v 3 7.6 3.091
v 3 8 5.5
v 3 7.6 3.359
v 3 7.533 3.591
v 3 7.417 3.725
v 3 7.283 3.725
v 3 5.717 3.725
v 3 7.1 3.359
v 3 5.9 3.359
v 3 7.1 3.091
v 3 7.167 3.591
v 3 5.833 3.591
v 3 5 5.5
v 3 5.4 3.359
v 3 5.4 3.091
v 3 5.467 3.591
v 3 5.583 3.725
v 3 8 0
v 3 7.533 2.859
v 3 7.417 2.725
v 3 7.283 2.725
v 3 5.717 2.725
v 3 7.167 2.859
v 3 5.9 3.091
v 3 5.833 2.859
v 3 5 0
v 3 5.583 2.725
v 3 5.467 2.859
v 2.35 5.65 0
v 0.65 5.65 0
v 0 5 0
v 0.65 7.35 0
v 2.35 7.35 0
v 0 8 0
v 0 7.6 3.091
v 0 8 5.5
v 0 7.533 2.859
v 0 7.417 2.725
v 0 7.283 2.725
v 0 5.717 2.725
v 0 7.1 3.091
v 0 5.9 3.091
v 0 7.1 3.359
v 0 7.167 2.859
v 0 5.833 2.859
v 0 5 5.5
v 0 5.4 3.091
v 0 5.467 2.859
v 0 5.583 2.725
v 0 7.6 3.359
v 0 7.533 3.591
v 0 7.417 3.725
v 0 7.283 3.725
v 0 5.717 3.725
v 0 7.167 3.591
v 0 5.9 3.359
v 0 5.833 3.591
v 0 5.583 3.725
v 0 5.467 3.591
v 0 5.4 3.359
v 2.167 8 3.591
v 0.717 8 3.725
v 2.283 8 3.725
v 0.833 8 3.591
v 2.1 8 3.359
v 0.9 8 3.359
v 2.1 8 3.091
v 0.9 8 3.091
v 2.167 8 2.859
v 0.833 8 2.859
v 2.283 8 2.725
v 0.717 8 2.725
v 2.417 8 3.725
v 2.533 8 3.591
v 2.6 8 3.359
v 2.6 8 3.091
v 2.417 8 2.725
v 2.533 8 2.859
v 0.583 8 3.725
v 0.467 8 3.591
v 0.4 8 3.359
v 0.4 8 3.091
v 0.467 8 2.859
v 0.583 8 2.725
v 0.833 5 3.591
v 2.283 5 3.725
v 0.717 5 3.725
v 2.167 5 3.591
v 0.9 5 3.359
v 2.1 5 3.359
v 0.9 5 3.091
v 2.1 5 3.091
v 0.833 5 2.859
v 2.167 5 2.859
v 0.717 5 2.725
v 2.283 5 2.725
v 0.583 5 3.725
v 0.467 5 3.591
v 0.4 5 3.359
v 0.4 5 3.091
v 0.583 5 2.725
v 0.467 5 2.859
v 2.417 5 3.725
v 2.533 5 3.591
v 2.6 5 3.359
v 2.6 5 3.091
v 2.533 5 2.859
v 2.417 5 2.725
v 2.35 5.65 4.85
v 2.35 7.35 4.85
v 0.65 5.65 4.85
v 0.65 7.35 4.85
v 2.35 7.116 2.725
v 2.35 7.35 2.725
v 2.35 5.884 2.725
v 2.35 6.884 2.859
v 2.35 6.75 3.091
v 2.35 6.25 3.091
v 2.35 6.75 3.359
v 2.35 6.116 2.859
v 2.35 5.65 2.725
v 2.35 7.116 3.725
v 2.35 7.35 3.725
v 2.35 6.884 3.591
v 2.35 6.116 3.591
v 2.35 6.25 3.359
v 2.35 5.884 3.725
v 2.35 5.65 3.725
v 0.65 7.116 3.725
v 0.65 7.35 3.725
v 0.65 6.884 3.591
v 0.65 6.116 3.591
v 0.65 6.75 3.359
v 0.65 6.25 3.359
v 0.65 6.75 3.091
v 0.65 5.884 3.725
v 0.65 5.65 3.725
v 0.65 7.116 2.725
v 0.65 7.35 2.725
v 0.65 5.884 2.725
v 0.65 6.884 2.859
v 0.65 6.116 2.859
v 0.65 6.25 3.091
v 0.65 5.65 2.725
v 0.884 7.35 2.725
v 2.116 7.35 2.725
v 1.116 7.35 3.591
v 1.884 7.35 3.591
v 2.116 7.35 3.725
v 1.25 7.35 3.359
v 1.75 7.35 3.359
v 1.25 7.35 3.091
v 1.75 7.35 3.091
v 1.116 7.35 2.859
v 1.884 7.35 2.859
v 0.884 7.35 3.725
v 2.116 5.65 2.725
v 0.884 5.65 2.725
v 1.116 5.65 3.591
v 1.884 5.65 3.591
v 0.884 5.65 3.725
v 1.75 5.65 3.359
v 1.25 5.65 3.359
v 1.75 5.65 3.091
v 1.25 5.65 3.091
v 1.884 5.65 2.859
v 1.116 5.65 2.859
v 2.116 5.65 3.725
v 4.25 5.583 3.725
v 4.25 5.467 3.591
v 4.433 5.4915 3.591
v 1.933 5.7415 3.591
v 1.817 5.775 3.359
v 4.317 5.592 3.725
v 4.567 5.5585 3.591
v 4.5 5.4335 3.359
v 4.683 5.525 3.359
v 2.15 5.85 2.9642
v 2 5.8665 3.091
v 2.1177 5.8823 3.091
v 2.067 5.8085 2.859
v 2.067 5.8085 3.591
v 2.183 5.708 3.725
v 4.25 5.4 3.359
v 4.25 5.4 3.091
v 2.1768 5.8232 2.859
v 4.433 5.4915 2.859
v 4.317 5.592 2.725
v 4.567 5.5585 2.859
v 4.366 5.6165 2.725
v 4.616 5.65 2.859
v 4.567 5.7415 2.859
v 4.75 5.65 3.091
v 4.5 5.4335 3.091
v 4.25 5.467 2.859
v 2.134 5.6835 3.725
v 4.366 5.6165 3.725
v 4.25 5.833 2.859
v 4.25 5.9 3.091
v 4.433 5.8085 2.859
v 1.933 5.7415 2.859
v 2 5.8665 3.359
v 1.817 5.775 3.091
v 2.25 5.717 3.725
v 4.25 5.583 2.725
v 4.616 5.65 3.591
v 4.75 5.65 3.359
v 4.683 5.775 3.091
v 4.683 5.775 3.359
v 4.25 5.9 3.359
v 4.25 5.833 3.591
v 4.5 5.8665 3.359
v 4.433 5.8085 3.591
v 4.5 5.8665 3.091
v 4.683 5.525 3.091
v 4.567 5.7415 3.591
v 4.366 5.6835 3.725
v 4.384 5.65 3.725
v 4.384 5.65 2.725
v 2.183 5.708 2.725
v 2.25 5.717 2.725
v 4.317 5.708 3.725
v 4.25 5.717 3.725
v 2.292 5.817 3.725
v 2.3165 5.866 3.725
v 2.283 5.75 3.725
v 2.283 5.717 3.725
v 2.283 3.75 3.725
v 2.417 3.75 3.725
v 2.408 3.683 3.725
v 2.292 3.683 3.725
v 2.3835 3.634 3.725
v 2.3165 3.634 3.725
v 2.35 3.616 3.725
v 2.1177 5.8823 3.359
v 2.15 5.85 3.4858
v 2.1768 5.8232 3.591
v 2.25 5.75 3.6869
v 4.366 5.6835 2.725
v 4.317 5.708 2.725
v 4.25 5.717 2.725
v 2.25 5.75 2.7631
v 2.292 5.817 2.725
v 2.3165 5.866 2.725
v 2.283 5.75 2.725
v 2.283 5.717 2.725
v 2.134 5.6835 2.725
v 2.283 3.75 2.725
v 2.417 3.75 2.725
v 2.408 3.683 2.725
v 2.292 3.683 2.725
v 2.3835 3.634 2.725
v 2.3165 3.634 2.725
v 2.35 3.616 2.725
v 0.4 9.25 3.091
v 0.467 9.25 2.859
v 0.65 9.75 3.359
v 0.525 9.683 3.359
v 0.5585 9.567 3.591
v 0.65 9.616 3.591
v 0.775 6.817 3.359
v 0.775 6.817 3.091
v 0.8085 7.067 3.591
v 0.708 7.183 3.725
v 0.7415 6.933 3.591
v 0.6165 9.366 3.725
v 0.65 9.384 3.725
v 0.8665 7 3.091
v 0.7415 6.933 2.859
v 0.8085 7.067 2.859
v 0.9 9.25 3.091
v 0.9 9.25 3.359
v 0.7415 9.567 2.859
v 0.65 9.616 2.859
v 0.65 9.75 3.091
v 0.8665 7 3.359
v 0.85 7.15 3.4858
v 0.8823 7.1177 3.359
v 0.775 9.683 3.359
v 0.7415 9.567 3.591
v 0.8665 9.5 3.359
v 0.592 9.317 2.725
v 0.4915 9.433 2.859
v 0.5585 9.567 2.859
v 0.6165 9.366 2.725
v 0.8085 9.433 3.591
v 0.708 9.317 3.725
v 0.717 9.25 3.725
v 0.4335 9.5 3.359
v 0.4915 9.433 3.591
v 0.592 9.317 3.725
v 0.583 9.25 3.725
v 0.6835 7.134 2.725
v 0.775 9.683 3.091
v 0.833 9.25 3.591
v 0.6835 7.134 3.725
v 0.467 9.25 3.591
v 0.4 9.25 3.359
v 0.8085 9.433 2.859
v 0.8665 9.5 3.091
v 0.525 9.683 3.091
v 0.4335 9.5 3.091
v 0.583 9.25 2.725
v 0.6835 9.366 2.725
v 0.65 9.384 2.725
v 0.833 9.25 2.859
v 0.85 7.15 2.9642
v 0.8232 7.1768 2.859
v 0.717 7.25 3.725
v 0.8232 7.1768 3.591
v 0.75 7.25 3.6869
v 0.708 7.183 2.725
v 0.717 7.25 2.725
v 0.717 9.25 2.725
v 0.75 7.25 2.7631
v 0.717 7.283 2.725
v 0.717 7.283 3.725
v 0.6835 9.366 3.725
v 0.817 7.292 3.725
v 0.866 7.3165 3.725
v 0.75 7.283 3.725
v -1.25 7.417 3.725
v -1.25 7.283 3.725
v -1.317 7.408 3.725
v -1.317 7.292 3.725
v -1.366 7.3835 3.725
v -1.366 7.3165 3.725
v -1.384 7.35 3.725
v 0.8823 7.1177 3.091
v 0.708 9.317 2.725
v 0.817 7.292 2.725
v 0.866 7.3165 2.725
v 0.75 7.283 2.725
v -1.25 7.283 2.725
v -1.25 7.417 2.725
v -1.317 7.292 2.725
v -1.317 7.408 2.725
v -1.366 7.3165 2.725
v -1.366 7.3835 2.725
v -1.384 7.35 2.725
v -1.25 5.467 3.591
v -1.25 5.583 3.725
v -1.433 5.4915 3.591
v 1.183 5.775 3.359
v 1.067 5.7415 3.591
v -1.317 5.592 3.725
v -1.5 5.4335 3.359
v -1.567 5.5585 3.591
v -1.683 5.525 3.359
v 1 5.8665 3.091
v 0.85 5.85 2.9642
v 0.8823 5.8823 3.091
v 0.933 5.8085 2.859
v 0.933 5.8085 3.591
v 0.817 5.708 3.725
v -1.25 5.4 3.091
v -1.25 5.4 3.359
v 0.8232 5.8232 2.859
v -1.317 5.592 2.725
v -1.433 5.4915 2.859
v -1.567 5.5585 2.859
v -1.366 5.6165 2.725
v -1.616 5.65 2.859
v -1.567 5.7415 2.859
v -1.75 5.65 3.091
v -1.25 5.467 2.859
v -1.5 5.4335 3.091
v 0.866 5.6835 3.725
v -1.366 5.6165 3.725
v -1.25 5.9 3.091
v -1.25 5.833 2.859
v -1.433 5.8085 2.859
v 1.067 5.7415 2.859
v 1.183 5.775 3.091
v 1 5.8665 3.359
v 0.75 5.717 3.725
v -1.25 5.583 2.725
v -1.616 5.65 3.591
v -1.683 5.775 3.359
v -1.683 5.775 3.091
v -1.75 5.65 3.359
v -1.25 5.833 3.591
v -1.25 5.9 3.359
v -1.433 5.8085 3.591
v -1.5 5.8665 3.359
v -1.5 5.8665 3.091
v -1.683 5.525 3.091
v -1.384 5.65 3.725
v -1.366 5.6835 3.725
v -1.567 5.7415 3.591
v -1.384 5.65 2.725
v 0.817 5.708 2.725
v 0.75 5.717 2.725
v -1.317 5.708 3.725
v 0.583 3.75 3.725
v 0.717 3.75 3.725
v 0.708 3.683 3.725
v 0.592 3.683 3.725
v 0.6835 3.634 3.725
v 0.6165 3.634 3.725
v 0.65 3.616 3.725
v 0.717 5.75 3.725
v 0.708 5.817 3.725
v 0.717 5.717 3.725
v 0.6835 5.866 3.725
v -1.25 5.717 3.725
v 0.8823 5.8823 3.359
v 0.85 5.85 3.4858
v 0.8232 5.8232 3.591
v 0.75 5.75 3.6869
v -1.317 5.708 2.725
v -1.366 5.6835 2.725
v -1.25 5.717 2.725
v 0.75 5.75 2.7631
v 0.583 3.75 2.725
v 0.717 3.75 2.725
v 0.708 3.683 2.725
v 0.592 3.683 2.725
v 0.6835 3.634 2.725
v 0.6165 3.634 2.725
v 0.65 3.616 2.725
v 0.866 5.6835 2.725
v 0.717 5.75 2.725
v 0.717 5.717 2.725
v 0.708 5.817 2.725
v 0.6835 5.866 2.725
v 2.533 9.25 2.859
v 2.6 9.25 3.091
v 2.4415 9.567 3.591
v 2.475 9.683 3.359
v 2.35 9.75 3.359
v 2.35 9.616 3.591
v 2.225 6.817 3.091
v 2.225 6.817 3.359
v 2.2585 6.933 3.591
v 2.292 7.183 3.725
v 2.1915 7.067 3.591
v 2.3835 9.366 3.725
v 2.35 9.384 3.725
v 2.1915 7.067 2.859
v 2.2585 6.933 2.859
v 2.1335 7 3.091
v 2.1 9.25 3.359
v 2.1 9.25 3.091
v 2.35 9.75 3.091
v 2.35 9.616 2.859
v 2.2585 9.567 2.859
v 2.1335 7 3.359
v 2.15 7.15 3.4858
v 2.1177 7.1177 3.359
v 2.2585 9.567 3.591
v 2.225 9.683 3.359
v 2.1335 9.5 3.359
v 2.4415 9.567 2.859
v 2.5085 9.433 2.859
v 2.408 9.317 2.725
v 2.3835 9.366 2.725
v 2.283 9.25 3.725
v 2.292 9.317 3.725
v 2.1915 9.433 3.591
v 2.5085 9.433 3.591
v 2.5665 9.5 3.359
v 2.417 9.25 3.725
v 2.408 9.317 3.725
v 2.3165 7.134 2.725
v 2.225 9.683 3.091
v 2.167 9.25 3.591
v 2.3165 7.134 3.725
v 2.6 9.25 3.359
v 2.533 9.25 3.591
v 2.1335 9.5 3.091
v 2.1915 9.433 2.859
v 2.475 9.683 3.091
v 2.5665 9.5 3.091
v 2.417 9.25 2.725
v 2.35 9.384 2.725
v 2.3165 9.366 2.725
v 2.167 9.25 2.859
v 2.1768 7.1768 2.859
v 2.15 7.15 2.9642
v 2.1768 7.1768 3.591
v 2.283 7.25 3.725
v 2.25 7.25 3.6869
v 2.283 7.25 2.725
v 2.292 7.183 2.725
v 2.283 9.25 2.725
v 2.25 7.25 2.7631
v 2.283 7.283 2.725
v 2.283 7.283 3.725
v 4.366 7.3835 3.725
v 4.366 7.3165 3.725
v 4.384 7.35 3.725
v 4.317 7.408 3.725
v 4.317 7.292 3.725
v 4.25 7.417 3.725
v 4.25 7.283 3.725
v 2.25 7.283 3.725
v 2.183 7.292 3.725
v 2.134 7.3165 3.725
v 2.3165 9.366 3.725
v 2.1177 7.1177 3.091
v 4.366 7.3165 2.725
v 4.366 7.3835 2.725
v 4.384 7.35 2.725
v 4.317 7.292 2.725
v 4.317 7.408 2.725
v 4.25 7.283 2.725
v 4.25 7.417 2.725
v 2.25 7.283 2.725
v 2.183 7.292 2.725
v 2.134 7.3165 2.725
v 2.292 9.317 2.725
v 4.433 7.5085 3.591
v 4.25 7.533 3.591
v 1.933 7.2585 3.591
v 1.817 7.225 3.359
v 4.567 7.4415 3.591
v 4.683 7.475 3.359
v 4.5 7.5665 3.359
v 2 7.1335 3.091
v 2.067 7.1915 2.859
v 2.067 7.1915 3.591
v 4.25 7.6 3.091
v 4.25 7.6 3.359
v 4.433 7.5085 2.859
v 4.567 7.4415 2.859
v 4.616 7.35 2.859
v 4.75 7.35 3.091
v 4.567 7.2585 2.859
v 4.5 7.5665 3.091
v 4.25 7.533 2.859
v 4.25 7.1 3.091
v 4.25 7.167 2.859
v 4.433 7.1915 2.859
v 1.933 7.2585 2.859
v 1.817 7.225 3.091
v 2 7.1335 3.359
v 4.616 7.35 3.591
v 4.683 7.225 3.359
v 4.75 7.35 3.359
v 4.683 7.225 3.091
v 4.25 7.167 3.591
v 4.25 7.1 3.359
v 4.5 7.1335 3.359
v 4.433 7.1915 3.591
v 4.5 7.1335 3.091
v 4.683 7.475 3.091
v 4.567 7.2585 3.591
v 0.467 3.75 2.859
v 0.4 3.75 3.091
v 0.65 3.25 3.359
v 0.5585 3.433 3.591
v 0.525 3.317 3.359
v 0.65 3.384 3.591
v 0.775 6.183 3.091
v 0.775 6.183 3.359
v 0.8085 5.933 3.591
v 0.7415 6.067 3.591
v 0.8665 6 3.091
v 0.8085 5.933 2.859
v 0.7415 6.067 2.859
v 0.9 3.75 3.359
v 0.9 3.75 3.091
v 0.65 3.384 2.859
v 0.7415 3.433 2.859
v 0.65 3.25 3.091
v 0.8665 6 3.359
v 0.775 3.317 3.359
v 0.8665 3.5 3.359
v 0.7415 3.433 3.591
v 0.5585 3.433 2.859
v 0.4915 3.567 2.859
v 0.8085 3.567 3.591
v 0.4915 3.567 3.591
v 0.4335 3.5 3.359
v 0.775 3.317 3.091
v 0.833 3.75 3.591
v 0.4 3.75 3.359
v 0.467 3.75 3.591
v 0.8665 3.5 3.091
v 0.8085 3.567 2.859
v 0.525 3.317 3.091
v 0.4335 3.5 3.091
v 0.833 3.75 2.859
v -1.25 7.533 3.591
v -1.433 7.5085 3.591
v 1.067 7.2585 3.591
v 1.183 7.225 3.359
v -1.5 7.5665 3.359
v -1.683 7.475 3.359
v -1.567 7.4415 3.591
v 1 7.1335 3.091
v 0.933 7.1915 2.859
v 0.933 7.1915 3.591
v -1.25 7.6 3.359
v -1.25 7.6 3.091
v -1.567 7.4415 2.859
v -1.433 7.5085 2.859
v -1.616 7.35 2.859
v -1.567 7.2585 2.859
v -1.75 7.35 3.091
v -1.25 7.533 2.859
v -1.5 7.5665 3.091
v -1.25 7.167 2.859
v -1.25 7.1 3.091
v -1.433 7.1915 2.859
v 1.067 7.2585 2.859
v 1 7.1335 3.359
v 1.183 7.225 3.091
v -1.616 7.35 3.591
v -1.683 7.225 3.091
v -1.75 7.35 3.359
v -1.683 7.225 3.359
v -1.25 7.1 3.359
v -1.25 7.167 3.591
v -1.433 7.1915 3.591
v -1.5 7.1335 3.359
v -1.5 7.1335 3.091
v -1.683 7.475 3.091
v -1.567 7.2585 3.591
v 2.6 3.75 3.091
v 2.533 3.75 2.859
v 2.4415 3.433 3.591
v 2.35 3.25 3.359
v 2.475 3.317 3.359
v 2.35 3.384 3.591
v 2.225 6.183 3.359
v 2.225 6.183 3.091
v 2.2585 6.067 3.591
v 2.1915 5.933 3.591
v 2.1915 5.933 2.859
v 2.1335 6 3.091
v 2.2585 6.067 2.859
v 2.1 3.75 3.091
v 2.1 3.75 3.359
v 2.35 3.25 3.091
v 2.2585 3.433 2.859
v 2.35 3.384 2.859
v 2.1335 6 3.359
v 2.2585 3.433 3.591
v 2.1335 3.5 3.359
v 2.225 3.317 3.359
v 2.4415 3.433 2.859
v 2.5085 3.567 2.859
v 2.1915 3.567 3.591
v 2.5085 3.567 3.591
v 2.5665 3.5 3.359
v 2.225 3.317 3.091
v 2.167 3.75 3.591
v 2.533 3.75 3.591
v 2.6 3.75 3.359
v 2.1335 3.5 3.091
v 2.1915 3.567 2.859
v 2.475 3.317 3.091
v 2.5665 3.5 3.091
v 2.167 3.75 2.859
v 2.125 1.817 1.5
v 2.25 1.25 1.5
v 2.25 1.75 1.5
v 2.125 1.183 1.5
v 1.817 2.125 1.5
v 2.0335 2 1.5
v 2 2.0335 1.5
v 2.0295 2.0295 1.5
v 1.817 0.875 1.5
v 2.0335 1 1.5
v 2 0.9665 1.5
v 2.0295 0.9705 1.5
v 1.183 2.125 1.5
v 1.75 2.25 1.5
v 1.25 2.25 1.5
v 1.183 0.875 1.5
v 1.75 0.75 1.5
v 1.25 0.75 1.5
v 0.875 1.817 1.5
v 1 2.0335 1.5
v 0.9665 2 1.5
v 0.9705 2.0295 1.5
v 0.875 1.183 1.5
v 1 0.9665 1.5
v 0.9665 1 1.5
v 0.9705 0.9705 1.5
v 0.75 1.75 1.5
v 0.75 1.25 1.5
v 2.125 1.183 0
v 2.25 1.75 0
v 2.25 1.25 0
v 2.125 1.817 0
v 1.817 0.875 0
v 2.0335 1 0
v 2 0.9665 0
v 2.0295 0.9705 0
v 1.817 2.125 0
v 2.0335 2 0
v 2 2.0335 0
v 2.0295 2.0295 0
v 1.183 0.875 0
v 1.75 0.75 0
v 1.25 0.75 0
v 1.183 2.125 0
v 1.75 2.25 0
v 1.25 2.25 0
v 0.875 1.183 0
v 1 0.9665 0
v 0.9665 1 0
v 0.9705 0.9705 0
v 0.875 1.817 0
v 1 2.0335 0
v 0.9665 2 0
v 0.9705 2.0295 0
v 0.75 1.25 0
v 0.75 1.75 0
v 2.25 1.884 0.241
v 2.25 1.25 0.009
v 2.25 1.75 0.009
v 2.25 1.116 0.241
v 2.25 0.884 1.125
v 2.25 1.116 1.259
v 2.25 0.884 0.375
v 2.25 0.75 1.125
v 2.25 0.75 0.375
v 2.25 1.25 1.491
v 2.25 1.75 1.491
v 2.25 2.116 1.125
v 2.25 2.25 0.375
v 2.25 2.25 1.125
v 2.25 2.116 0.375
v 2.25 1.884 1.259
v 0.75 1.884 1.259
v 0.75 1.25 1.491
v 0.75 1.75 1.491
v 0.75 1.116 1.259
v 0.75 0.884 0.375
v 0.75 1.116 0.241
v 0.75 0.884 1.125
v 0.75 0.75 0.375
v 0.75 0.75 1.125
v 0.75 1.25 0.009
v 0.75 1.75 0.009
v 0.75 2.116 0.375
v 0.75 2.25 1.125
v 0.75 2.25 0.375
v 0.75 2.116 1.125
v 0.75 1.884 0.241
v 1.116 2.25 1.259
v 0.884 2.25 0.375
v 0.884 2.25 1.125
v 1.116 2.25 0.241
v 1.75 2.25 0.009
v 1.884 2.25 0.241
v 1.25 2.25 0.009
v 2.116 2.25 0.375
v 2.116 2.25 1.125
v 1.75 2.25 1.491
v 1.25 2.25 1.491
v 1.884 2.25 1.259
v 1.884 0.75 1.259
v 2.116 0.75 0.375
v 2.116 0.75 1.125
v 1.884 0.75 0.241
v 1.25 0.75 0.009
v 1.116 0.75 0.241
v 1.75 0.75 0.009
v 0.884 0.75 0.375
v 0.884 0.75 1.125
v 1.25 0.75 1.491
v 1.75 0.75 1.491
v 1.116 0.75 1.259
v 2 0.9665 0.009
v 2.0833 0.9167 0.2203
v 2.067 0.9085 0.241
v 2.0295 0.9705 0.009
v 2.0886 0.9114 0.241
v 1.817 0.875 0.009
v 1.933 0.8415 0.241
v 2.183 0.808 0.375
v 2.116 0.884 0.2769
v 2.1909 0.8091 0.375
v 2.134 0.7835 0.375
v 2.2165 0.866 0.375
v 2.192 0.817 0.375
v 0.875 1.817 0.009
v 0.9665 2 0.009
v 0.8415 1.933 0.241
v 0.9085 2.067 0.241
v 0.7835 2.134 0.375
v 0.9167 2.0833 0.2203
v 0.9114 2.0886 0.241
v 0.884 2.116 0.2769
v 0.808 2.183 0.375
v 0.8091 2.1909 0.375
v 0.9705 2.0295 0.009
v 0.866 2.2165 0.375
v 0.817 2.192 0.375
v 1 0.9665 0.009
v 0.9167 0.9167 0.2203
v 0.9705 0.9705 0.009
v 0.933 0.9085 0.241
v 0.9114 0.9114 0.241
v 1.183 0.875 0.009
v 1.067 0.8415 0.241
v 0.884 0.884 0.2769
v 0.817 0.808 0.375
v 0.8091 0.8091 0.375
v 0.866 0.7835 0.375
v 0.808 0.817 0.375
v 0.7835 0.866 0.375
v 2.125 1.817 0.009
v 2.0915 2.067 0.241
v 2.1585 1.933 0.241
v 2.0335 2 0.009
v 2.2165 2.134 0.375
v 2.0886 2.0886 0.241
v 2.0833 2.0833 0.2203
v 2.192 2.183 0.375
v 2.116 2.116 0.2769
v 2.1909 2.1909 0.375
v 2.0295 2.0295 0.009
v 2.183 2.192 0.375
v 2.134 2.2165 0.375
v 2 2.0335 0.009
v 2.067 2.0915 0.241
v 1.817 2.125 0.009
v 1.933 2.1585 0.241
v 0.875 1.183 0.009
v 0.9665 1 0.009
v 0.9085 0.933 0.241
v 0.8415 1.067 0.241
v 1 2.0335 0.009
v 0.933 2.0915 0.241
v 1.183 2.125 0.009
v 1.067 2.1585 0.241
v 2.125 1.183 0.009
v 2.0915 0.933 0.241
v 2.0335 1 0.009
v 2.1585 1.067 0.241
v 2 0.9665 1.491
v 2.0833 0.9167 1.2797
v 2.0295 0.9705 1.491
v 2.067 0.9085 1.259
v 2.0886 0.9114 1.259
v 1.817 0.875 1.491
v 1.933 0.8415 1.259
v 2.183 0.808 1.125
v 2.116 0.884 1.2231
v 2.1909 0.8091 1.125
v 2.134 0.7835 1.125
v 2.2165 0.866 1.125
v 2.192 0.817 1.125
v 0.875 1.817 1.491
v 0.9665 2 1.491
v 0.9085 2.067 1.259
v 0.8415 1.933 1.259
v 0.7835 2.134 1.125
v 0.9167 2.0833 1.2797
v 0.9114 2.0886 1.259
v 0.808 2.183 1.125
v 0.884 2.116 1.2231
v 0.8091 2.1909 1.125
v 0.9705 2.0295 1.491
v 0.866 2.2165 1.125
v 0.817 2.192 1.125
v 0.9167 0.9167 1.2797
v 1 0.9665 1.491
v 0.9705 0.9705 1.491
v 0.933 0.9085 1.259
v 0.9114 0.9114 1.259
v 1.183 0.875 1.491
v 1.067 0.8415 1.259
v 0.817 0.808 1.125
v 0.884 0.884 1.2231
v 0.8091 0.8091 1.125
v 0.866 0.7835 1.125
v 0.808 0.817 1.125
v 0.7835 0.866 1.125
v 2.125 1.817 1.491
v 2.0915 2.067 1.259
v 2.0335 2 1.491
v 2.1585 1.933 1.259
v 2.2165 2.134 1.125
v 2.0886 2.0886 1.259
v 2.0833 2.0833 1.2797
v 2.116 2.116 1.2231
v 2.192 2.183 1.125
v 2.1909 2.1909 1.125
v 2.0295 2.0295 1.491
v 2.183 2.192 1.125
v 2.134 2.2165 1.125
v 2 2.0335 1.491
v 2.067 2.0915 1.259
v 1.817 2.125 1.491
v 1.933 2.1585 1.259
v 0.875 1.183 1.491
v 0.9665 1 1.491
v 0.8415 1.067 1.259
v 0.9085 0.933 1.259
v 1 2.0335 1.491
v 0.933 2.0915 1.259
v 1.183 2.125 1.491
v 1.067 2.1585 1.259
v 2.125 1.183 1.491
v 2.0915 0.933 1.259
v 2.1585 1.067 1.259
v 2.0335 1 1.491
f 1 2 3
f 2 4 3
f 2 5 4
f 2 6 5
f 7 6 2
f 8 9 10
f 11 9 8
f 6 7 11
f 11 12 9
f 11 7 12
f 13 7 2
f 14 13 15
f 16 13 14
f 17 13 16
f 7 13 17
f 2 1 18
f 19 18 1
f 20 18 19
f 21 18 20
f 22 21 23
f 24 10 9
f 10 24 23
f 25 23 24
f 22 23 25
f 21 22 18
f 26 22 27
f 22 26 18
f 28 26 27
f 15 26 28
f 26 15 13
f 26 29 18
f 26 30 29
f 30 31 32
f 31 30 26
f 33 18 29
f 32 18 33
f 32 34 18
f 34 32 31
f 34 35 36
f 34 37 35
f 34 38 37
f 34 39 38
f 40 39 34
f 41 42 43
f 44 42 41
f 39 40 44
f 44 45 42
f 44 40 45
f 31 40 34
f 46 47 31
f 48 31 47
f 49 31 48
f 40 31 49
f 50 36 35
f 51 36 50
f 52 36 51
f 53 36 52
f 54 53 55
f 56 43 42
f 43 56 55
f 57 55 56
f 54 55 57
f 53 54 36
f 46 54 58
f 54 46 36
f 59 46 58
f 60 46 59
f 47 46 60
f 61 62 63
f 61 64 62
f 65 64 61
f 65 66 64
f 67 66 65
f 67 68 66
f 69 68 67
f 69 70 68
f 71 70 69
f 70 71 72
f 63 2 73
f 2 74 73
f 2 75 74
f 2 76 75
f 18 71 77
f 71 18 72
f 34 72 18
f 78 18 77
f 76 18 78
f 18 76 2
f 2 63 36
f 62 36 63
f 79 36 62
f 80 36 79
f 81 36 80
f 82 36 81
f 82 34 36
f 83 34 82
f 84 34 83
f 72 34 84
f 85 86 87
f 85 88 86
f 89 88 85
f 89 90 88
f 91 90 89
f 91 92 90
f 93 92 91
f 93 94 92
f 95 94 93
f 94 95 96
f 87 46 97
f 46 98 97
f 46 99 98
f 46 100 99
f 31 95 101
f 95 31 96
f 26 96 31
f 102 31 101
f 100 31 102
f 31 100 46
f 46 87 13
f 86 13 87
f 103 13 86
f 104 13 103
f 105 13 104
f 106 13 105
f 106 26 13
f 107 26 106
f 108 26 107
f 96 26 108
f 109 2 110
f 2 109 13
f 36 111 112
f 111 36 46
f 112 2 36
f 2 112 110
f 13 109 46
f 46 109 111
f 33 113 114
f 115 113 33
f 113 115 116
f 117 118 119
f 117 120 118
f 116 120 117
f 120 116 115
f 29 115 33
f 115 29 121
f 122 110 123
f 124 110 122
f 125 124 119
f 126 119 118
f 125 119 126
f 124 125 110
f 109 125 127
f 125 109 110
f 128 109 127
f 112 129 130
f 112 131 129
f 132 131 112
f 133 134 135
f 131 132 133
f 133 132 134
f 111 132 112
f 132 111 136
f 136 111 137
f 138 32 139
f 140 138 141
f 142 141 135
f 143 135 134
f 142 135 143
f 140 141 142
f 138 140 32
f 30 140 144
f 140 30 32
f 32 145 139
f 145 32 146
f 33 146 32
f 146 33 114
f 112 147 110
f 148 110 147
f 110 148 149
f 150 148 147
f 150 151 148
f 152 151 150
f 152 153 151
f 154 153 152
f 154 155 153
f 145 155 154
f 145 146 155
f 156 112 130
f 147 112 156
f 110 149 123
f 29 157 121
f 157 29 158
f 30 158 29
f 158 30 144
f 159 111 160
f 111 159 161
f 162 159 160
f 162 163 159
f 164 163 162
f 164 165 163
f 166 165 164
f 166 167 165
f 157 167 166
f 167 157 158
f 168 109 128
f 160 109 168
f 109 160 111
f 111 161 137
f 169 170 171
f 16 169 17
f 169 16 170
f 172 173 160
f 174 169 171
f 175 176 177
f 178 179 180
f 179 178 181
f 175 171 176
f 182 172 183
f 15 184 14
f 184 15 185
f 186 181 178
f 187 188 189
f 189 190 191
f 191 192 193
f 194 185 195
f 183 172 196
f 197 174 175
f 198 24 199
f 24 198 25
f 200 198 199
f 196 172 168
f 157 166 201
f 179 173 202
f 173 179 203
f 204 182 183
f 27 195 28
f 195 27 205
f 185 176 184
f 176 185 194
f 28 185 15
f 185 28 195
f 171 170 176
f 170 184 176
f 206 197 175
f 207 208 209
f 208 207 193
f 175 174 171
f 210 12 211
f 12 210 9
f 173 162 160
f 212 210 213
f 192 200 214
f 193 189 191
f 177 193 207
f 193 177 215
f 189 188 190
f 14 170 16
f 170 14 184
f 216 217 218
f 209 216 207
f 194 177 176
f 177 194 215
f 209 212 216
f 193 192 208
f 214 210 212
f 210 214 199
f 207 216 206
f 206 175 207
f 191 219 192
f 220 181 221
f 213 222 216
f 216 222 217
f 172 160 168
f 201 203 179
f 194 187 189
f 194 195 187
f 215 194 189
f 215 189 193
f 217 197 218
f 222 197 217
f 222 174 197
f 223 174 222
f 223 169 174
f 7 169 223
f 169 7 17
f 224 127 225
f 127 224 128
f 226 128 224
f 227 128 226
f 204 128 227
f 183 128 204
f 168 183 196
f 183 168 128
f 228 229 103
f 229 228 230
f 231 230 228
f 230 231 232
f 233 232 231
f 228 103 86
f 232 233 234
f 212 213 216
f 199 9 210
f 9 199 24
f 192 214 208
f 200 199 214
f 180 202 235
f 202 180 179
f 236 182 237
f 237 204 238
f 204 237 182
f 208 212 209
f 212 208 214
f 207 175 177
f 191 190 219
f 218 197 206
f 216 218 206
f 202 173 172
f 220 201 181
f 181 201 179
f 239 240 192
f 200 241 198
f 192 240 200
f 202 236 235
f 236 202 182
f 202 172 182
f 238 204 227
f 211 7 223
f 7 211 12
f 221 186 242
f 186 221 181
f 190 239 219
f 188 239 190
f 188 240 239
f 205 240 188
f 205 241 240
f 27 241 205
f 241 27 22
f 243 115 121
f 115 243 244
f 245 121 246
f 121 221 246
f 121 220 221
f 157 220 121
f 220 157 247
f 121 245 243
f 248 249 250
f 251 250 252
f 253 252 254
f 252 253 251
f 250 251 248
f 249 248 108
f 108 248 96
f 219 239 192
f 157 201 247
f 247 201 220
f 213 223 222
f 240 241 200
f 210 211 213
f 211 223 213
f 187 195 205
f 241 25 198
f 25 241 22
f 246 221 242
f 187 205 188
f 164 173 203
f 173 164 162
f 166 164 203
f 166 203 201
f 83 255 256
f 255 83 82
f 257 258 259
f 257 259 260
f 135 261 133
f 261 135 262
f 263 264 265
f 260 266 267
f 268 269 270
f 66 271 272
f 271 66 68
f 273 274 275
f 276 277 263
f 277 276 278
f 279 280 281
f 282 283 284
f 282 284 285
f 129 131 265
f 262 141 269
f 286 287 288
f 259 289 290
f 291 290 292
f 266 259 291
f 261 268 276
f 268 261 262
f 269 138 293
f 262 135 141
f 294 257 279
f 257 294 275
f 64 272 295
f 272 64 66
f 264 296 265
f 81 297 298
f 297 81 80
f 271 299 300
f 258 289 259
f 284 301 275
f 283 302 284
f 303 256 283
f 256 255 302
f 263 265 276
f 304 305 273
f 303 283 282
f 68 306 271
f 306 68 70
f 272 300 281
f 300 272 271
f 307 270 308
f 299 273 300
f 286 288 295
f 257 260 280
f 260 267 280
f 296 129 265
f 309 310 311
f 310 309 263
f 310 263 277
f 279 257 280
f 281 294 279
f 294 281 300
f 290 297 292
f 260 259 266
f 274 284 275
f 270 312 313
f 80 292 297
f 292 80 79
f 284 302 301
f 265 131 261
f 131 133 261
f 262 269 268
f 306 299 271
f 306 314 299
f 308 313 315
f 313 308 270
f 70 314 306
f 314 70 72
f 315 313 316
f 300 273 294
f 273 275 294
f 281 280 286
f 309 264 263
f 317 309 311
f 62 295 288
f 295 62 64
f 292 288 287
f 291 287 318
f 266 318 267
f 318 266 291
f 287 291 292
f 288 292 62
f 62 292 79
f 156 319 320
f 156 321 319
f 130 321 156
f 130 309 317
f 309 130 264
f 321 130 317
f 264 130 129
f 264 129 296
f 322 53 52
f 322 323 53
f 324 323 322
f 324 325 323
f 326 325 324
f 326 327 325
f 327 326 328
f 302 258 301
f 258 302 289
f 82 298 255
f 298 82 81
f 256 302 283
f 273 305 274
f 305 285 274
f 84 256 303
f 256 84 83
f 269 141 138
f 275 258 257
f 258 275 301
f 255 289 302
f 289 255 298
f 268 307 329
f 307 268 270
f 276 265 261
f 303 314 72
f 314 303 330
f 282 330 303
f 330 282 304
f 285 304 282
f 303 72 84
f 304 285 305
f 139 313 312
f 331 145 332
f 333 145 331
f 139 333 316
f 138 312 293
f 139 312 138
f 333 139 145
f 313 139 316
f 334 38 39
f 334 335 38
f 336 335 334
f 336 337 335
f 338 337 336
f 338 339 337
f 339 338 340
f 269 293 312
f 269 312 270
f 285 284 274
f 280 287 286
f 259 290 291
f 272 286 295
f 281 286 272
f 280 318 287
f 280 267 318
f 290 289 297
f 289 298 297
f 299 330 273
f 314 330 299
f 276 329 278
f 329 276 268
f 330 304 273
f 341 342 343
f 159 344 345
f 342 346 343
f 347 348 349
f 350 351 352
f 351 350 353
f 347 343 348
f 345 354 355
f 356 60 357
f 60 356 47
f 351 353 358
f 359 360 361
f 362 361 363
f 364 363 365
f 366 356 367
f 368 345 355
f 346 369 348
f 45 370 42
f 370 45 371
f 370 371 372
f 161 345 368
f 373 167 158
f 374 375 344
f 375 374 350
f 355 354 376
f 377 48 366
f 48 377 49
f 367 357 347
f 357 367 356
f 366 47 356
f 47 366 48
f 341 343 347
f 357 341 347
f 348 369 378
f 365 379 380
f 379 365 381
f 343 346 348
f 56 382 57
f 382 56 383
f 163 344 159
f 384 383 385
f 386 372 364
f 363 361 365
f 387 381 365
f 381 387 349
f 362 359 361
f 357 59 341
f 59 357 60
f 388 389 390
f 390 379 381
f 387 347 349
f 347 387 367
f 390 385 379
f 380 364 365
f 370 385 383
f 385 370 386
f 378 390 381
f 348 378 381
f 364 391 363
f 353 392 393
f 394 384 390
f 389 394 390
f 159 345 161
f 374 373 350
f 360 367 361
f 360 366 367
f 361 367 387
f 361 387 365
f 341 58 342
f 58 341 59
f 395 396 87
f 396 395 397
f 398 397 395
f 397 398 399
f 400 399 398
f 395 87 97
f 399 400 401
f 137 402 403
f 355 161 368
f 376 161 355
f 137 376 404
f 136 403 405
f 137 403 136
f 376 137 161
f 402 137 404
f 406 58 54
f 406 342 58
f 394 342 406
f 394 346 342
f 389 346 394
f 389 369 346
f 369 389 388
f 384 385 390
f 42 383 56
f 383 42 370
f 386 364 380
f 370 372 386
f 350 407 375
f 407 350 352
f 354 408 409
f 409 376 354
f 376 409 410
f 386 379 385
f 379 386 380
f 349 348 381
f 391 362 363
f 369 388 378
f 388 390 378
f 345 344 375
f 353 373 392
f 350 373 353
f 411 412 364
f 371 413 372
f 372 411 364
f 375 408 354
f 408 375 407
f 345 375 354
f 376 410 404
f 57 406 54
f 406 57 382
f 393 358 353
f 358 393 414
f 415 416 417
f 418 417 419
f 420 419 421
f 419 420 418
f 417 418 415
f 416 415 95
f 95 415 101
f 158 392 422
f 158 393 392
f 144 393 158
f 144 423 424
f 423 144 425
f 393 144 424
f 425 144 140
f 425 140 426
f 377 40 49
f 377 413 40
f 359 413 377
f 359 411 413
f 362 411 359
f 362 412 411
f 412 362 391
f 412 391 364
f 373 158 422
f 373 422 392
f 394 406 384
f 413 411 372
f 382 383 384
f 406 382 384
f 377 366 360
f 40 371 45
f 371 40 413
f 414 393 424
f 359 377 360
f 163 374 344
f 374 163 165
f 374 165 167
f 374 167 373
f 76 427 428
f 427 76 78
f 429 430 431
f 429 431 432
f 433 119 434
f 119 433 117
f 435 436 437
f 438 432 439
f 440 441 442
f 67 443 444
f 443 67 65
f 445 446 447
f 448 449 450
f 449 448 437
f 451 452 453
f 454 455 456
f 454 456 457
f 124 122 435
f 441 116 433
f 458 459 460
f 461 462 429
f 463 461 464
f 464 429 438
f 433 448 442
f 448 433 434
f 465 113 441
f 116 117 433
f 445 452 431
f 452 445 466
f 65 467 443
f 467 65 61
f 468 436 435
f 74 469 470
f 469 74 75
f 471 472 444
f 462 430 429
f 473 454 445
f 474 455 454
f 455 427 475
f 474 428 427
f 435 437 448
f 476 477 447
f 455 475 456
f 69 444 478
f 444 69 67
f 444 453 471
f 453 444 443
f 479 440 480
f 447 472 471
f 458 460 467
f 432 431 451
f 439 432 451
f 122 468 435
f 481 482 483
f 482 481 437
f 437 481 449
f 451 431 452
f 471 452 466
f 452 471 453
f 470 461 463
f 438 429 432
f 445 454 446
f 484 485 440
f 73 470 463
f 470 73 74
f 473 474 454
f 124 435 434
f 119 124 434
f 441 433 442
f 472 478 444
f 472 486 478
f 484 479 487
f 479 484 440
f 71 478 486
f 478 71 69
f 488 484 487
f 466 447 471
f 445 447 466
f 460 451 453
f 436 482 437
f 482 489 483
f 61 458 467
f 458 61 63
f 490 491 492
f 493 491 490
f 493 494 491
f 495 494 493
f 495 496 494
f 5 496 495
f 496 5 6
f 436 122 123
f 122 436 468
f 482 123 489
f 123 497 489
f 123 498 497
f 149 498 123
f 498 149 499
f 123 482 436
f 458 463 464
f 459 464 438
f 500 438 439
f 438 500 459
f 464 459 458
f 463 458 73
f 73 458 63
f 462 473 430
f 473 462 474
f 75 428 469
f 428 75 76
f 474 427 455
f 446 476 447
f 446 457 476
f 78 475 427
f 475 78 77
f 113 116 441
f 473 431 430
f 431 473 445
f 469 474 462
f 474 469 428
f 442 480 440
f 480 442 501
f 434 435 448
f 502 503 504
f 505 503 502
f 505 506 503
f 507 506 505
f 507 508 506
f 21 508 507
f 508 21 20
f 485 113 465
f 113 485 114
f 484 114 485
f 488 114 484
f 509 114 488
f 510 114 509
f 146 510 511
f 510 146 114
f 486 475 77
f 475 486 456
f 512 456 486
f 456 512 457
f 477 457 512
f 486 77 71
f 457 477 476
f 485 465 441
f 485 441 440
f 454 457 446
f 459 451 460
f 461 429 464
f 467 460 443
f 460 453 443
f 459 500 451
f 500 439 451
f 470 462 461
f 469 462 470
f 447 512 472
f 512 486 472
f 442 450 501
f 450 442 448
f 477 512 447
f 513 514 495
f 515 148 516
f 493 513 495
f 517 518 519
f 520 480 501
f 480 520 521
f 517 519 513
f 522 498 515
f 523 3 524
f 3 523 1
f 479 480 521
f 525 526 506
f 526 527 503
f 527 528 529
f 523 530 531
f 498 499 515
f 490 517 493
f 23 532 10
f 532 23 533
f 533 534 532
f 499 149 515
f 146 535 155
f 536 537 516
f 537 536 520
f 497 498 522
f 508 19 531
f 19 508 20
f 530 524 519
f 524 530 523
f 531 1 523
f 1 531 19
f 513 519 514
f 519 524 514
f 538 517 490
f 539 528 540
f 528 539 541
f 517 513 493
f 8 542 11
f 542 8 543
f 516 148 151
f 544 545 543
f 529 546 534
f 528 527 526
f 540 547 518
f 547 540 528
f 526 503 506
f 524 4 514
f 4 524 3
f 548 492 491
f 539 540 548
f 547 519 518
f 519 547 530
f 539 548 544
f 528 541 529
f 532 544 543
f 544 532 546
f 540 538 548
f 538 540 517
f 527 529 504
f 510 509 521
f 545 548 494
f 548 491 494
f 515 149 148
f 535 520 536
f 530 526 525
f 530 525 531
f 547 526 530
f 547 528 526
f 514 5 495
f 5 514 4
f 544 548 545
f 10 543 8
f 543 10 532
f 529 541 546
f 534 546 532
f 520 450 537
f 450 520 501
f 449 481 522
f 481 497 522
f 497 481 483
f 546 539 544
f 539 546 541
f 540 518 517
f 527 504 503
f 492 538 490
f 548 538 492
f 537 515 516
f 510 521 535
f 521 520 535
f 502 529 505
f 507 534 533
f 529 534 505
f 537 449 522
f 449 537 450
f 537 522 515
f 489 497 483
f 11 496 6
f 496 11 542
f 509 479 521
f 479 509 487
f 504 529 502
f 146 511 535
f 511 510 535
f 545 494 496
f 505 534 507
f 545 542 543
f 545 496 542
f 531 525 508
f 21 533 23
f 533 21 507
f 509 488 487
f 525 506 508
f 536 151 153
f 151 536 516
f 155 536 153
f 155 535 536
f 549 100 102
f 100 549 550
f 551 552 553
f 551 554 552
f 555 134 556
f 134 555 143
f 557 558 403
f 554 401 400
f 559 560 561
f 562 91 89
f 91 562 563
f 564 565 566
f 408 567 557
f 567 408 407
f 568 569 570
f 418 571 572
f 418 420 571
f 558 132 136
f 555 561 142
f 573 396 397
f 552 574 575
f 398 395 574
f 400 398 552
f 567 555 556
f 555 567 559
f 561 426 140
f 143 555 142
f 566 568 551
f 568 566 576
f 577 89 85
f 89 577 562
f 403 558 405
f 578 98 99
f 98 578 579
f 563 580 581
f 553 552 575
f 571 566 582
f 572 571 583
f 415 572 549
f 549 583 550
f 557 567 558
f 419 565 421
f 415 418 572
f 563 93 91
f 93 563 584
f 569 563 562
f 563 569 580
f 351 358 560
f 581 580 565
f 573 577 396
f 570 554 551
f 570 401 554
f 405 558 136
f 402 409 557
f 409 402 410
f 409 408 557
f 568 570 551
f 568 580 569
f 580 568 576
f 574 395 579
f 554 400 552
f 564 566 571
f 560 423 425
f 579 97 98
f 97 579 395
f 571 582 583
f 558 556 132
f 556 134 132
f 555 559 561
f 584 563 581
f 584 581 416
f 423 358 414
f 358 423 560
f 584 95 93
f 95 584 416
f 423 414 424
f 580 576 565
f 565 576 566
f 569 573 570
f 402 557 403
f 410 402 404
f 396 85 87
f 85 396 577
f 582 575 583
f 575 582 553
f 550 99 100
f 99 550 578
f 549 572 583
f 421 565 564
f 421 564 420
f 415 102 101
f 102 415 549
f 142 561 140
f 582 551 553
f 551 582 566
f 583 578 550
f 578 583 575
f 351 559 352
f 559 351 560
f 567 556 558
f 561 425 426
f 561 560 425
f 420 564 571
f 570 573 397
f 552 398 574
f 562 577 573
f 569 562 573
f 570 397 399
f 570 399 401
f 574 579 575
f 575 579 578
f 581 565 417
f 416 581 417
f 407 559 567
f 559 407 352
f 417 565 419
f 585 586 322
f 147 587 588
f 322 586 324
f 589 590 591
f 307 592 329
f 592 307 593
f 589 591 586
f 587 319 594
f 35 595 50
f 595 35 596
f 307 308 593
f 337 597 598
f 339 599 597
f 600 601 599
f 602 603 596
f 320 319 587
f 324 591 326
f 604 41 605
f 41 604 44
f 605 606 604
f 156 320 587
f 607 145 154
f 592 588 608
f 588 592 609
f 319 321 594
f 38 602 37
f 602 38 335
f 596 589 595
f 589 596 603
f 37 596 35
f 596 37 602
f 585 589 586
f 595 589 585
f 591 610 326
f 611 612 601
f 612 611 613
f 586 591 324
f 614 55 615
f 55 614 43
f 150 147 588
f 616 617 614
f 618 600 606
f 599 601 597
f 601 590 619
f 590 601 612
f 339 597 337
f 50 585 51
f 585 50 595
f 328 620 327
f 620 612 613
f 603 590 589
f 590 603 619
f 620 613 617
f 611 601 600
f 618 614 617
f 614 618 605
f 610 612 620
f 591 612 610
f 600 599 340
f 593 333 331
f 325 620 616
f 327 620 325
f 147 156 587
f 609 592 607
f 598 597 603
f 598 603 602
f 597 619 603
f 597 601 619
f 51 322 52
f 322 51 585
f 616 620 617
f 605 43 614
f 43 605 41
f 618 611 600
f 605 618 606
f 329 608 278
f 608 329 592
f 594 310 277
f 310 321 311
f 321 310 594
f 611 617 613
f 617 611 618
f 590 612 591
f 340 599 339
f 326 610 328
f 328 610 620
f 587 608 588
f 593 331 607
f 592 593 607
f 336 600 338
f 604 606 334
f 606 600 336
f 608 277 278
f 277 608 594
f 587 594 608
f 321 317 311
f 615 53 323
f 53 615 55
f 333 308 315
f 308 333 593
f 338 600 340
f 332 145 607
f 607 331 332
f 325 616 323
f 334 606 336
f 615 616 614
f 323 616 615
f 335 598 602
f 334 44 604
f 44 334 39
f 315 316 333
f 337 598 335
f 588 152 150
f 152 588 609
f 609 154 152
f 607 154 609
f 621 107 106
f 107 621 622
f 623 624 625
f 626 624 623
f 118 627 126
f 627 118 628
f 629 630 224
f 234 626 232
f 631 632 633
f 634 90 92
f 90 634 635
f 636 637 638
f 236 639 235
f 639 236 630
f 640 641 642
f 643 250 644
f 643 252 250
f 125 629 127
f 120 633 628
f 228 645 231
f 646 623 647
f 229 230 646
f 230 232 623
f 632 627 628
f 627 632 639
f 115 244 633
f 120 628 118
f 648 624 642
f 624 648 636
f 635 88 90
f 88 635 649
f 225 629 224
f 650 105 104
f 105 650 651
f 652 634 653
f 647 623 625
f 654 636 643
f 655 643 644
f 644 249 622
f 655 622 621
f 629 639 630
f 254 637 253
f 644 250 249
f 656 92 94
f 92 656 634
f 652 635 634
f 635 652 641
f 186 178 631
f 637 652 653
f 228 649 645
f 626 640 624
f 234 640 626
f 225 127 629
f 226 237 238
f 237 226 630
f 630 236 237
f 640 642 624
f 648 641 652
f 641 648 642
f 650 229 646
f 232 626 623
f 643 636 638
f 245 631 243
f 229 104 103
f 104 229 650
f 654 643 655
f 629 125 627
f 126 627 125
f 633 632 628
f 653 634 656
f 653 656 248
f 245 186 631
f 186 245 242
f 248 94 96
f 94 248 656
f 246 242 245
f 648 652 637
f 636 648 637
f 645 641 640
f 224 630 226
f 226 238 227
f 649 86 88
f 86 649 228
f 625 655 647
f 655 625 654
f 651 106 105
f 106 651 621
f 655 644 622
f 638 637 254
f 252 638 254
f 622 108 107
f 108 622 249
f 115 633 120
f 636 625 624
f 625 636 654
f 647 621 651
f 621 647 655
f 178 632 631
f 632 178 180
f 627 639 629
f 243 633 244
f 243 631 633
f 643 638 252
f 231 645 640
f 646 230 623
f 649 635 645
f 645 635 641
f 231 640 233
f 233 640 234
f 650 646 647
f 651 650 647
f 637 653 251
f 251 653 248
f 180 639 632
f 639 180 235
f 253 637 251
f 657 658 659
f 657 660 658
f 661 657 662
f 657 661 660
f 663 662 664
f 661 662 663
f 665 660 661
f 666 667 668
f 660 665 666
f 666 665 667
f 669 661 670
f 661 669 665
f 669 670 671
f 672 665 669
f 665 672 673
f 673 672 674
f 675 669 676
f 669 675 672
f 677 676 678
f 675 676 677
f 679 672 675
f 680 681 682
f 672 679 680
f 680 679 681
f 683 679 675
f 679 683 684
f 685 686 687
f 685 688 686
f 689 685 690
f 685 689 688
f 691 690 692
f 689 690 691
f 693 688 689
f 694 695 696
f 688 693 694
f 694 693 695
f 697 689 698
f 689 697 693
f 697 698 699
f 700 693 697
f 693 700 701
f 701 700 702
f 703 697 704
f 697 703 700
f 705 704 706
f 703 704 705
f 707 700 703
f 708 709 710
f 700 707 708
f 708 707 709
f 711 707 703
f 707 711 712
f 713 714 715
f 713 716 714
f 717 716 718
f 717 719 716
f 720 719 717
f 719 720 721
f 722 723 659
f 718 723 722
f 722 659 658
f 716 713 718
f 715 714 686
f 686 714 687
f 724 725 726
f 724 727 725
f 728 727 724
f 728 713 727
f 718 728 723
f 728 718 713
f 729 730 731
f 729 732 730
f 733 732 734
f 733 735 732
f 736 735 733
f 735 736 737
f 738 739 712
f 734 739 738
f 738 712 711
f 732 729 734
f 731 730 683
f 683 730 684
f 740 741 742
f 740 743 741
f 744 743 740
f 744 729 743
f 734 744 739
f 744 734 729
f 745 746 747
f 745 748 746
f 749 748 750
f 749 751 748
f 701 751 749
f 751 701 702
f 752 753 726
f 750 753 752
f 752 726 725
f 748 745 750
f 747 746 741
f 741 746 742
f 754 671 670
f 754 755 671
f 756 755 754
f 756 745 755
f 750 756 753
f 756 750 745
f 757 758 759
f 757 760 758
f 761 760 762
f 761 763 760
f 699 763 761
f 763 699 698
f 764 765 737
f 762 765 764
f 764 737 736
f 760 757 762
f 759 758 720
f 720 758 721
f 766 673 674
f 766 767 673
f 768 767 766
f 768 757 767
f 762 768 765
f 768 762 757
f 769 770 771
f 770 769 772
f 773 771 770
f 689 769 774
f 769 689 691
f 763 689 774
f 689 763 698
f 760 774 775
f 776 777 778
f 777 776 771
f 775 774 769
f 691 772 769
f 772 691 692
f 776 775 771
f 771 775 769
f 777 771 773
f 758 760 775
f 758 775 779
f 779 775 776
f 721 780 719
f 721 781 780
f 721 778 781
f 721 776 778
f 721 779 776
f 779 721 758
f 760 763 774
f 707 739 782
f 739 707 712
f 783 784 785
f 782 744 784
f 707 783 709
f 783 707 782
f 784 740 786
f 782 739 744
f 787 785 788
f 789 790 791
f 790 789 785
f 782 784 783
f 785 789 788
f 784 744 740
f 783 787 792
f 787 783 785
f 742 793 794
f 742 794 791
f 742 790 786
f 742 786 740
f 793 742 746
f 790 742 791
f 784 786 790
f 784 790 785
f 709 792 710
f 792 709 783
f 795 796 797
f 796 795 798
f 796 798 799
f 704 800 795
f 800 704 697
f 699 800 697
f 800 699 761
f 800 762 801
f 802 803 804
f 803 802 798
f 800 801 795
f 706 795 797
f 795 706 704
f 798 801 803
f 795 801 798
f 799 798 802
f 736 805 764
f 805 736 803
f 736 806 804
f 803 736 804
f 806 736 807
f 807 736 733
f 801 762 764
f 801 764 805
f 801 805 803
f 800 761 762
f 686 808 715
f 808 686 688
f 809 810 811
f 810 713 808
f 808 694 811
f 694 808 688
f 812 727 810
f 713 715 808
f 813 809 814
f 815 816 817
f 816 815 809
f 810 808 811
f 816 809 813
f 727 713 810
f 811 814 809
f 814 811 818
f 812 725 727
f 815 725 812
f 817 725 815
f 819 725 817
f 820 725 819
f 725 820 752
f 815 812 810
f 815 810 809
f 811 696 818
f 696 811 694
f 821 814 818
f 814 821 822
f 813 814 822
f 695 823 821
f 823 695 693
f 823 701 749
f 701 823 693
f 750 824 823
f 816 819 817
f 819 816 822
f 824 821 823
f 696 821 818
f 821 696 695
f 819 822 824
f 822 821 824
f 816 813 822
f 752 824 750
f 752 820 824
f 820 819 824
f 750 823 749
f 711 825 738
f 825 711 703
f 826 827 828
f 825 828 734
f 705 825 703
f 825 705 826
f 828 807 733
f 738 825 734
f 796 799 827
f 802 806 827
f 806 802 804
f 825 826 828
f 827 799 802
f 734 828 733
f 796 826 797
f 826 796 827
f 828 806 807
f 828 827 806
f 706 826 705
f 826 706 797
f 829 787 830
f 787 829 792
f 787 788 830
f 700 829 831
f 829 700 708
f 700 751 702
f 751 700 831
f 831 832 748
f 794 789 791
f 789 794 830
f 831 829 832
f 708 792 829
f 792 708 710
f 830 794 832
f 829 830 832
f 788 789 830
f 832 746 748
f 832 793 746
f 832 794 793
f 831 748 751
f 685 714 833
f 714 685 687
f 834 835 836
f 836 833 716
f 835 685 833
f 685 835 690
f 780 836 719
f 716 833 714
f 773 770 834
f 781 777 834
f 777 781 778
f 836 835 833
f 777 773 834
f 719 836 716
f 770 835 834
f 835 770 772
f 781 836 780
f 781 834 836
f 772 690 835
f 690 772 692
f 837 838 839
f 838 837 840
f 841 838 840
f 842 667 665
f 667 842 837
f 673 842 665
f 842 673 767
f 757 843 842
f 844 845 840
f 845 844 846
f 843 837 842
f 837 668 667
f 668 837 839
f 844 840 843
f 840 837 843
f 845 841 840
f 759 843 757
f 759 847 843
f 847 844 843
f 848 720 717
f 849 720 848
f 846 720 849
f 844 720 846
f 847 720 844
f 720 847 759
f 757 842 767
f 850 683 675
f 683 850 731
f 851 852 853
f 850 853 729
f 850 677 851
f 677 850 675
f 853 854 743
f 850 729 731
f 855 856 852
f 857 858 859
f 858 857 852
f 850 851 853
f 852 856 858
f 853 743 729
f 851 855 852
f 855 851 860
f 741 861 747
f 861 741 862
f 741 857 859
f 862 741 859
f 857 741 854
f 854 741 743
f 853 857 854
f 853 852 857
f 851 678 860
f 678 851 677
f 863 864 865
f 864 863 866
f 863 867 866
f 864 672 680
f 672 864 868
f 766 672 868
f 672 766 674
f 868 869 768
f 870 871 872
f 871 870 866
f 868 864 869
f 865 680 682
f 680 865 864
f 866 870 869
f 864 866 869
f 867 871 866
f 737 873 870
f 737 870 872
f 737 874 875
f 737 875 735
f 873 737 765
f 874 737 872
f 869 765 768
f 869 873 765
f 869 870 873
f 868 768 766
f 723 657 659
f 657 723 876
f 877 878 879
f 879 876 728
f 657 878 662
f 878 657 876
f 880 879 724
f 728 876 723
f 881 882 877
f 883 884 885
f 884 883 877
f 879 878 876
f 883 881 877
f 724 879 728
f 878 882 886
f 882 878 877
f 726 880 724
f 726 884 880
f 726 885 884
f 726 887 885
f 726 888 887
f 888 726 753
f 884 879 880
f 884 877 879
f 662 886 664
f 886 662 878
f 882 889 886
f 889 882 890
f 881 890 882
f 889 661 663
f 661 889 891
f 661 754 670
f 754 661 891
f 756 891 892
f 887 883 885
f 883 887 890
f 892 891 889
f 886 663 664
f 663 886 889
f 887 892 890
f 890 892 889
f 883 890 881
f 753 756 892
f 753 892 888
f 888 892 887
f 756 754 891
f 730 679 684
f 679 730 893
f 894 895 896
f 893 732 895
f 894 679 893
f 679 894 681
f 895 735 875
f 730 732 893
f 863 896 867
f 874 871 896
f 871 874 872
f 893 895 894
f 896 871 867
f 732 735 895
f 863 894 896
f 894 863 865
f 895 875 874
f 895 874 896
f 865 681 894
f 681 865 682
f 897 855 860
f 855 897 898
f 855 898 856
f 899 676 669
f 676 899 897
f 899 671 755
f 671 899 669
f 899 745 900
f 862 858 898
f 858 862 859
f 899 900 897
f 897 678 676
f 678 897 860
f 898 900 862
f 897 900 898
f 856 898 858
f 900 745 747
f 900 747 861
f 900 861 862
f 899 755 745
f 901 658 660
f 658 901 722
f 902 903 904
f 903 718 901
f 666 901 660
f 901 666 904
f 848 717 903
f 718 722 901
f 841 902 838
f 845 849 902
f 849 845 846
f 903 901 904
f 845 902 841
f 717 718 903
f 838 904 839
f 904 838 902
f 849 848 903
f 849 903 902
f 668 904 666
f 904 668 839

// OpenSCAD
// BGSD
include <../lib/boardgame_insert_toolkit_lib.4.scad>;
data = [
    // Source STL: Tiles.stl
    // STL bbox min [-191, -62.5, 0] max [-113, 101, 69] size [78, 163.5, 69]
    // Detected compartments: 2; wall thickness: 1.5mm
    // Estimated bottom thickness: 0.8mm
    // Inferred side cutouts: front (high), back (high)
    // Tiles cavity 1: SQUARE shape (high, curved ratio 0)
    // Tiles cavity 2: SQUARE shape (high, curved ratio 0)
    [ OBJECT_BOX,
        [ NAME, "Tiles" ],
        [ BOX_SIZE_XYZ, [78, 163.5, 69] ],
        [ BOX_WALL_THICKNESS, 1.5 ],
        [ BOX_NO_LID_B, true ],
        [ BOX_FEATURE,
            [ NAME, "Tiles cavity 1" ],
            [ FTR_COMPARTMENT_SIZE_XYZ, [75, 84, 67.5] ],
            [ FTR_NUM_COMPARTMENTS_XY, [1, 1] ],
            [ FTR_SHAPE, SQUARE ],
            [ POSITION_XY, [0, 0] ],
            [ FTR_CUTOUT_SIDES_4B, [true, false, false, false] ],
            [ FTR_CUTOUT_TYPE, BOTH ],
            [ FTR_CUTOUT_HEIGHT_PCT, 100 ],
            [ FTR_CUTOUT_DEPTH_PCT, 7.143 ],
            [ FTR_CUTOUT_WIDTH_PCT, 37.34 ],
        ],
        [ BOX_FEATURE,
            [ NAME, "Tiles cavity 2" ],
            [ FTR_COMPARTMENT_SIZE_XYZ, [75, 75, 67.5] ],
            [ FTR_NUM_COMPARTMENTS_XY, [1, 1] ],
            [ FTR_SHAPE, SQUARE ],
            [ POSITION_XY, [0, 85.5] ],
            [ FTR_CUTOUT_SIDES_4B, [false, true, false, false] ],
            [ FTR_CUTOUT_TYPE, BOTH ],
            [ FTR_CUTOUT_HEIGHT_PCT, 82.437 ],
            [ FTR_CUTOUT_DEPTH_PCT, 8 ],
            [ FTR_CUTOUT_WIDTH_PCT, 37.34 ],
        ],
    ],
];
Make(data);
